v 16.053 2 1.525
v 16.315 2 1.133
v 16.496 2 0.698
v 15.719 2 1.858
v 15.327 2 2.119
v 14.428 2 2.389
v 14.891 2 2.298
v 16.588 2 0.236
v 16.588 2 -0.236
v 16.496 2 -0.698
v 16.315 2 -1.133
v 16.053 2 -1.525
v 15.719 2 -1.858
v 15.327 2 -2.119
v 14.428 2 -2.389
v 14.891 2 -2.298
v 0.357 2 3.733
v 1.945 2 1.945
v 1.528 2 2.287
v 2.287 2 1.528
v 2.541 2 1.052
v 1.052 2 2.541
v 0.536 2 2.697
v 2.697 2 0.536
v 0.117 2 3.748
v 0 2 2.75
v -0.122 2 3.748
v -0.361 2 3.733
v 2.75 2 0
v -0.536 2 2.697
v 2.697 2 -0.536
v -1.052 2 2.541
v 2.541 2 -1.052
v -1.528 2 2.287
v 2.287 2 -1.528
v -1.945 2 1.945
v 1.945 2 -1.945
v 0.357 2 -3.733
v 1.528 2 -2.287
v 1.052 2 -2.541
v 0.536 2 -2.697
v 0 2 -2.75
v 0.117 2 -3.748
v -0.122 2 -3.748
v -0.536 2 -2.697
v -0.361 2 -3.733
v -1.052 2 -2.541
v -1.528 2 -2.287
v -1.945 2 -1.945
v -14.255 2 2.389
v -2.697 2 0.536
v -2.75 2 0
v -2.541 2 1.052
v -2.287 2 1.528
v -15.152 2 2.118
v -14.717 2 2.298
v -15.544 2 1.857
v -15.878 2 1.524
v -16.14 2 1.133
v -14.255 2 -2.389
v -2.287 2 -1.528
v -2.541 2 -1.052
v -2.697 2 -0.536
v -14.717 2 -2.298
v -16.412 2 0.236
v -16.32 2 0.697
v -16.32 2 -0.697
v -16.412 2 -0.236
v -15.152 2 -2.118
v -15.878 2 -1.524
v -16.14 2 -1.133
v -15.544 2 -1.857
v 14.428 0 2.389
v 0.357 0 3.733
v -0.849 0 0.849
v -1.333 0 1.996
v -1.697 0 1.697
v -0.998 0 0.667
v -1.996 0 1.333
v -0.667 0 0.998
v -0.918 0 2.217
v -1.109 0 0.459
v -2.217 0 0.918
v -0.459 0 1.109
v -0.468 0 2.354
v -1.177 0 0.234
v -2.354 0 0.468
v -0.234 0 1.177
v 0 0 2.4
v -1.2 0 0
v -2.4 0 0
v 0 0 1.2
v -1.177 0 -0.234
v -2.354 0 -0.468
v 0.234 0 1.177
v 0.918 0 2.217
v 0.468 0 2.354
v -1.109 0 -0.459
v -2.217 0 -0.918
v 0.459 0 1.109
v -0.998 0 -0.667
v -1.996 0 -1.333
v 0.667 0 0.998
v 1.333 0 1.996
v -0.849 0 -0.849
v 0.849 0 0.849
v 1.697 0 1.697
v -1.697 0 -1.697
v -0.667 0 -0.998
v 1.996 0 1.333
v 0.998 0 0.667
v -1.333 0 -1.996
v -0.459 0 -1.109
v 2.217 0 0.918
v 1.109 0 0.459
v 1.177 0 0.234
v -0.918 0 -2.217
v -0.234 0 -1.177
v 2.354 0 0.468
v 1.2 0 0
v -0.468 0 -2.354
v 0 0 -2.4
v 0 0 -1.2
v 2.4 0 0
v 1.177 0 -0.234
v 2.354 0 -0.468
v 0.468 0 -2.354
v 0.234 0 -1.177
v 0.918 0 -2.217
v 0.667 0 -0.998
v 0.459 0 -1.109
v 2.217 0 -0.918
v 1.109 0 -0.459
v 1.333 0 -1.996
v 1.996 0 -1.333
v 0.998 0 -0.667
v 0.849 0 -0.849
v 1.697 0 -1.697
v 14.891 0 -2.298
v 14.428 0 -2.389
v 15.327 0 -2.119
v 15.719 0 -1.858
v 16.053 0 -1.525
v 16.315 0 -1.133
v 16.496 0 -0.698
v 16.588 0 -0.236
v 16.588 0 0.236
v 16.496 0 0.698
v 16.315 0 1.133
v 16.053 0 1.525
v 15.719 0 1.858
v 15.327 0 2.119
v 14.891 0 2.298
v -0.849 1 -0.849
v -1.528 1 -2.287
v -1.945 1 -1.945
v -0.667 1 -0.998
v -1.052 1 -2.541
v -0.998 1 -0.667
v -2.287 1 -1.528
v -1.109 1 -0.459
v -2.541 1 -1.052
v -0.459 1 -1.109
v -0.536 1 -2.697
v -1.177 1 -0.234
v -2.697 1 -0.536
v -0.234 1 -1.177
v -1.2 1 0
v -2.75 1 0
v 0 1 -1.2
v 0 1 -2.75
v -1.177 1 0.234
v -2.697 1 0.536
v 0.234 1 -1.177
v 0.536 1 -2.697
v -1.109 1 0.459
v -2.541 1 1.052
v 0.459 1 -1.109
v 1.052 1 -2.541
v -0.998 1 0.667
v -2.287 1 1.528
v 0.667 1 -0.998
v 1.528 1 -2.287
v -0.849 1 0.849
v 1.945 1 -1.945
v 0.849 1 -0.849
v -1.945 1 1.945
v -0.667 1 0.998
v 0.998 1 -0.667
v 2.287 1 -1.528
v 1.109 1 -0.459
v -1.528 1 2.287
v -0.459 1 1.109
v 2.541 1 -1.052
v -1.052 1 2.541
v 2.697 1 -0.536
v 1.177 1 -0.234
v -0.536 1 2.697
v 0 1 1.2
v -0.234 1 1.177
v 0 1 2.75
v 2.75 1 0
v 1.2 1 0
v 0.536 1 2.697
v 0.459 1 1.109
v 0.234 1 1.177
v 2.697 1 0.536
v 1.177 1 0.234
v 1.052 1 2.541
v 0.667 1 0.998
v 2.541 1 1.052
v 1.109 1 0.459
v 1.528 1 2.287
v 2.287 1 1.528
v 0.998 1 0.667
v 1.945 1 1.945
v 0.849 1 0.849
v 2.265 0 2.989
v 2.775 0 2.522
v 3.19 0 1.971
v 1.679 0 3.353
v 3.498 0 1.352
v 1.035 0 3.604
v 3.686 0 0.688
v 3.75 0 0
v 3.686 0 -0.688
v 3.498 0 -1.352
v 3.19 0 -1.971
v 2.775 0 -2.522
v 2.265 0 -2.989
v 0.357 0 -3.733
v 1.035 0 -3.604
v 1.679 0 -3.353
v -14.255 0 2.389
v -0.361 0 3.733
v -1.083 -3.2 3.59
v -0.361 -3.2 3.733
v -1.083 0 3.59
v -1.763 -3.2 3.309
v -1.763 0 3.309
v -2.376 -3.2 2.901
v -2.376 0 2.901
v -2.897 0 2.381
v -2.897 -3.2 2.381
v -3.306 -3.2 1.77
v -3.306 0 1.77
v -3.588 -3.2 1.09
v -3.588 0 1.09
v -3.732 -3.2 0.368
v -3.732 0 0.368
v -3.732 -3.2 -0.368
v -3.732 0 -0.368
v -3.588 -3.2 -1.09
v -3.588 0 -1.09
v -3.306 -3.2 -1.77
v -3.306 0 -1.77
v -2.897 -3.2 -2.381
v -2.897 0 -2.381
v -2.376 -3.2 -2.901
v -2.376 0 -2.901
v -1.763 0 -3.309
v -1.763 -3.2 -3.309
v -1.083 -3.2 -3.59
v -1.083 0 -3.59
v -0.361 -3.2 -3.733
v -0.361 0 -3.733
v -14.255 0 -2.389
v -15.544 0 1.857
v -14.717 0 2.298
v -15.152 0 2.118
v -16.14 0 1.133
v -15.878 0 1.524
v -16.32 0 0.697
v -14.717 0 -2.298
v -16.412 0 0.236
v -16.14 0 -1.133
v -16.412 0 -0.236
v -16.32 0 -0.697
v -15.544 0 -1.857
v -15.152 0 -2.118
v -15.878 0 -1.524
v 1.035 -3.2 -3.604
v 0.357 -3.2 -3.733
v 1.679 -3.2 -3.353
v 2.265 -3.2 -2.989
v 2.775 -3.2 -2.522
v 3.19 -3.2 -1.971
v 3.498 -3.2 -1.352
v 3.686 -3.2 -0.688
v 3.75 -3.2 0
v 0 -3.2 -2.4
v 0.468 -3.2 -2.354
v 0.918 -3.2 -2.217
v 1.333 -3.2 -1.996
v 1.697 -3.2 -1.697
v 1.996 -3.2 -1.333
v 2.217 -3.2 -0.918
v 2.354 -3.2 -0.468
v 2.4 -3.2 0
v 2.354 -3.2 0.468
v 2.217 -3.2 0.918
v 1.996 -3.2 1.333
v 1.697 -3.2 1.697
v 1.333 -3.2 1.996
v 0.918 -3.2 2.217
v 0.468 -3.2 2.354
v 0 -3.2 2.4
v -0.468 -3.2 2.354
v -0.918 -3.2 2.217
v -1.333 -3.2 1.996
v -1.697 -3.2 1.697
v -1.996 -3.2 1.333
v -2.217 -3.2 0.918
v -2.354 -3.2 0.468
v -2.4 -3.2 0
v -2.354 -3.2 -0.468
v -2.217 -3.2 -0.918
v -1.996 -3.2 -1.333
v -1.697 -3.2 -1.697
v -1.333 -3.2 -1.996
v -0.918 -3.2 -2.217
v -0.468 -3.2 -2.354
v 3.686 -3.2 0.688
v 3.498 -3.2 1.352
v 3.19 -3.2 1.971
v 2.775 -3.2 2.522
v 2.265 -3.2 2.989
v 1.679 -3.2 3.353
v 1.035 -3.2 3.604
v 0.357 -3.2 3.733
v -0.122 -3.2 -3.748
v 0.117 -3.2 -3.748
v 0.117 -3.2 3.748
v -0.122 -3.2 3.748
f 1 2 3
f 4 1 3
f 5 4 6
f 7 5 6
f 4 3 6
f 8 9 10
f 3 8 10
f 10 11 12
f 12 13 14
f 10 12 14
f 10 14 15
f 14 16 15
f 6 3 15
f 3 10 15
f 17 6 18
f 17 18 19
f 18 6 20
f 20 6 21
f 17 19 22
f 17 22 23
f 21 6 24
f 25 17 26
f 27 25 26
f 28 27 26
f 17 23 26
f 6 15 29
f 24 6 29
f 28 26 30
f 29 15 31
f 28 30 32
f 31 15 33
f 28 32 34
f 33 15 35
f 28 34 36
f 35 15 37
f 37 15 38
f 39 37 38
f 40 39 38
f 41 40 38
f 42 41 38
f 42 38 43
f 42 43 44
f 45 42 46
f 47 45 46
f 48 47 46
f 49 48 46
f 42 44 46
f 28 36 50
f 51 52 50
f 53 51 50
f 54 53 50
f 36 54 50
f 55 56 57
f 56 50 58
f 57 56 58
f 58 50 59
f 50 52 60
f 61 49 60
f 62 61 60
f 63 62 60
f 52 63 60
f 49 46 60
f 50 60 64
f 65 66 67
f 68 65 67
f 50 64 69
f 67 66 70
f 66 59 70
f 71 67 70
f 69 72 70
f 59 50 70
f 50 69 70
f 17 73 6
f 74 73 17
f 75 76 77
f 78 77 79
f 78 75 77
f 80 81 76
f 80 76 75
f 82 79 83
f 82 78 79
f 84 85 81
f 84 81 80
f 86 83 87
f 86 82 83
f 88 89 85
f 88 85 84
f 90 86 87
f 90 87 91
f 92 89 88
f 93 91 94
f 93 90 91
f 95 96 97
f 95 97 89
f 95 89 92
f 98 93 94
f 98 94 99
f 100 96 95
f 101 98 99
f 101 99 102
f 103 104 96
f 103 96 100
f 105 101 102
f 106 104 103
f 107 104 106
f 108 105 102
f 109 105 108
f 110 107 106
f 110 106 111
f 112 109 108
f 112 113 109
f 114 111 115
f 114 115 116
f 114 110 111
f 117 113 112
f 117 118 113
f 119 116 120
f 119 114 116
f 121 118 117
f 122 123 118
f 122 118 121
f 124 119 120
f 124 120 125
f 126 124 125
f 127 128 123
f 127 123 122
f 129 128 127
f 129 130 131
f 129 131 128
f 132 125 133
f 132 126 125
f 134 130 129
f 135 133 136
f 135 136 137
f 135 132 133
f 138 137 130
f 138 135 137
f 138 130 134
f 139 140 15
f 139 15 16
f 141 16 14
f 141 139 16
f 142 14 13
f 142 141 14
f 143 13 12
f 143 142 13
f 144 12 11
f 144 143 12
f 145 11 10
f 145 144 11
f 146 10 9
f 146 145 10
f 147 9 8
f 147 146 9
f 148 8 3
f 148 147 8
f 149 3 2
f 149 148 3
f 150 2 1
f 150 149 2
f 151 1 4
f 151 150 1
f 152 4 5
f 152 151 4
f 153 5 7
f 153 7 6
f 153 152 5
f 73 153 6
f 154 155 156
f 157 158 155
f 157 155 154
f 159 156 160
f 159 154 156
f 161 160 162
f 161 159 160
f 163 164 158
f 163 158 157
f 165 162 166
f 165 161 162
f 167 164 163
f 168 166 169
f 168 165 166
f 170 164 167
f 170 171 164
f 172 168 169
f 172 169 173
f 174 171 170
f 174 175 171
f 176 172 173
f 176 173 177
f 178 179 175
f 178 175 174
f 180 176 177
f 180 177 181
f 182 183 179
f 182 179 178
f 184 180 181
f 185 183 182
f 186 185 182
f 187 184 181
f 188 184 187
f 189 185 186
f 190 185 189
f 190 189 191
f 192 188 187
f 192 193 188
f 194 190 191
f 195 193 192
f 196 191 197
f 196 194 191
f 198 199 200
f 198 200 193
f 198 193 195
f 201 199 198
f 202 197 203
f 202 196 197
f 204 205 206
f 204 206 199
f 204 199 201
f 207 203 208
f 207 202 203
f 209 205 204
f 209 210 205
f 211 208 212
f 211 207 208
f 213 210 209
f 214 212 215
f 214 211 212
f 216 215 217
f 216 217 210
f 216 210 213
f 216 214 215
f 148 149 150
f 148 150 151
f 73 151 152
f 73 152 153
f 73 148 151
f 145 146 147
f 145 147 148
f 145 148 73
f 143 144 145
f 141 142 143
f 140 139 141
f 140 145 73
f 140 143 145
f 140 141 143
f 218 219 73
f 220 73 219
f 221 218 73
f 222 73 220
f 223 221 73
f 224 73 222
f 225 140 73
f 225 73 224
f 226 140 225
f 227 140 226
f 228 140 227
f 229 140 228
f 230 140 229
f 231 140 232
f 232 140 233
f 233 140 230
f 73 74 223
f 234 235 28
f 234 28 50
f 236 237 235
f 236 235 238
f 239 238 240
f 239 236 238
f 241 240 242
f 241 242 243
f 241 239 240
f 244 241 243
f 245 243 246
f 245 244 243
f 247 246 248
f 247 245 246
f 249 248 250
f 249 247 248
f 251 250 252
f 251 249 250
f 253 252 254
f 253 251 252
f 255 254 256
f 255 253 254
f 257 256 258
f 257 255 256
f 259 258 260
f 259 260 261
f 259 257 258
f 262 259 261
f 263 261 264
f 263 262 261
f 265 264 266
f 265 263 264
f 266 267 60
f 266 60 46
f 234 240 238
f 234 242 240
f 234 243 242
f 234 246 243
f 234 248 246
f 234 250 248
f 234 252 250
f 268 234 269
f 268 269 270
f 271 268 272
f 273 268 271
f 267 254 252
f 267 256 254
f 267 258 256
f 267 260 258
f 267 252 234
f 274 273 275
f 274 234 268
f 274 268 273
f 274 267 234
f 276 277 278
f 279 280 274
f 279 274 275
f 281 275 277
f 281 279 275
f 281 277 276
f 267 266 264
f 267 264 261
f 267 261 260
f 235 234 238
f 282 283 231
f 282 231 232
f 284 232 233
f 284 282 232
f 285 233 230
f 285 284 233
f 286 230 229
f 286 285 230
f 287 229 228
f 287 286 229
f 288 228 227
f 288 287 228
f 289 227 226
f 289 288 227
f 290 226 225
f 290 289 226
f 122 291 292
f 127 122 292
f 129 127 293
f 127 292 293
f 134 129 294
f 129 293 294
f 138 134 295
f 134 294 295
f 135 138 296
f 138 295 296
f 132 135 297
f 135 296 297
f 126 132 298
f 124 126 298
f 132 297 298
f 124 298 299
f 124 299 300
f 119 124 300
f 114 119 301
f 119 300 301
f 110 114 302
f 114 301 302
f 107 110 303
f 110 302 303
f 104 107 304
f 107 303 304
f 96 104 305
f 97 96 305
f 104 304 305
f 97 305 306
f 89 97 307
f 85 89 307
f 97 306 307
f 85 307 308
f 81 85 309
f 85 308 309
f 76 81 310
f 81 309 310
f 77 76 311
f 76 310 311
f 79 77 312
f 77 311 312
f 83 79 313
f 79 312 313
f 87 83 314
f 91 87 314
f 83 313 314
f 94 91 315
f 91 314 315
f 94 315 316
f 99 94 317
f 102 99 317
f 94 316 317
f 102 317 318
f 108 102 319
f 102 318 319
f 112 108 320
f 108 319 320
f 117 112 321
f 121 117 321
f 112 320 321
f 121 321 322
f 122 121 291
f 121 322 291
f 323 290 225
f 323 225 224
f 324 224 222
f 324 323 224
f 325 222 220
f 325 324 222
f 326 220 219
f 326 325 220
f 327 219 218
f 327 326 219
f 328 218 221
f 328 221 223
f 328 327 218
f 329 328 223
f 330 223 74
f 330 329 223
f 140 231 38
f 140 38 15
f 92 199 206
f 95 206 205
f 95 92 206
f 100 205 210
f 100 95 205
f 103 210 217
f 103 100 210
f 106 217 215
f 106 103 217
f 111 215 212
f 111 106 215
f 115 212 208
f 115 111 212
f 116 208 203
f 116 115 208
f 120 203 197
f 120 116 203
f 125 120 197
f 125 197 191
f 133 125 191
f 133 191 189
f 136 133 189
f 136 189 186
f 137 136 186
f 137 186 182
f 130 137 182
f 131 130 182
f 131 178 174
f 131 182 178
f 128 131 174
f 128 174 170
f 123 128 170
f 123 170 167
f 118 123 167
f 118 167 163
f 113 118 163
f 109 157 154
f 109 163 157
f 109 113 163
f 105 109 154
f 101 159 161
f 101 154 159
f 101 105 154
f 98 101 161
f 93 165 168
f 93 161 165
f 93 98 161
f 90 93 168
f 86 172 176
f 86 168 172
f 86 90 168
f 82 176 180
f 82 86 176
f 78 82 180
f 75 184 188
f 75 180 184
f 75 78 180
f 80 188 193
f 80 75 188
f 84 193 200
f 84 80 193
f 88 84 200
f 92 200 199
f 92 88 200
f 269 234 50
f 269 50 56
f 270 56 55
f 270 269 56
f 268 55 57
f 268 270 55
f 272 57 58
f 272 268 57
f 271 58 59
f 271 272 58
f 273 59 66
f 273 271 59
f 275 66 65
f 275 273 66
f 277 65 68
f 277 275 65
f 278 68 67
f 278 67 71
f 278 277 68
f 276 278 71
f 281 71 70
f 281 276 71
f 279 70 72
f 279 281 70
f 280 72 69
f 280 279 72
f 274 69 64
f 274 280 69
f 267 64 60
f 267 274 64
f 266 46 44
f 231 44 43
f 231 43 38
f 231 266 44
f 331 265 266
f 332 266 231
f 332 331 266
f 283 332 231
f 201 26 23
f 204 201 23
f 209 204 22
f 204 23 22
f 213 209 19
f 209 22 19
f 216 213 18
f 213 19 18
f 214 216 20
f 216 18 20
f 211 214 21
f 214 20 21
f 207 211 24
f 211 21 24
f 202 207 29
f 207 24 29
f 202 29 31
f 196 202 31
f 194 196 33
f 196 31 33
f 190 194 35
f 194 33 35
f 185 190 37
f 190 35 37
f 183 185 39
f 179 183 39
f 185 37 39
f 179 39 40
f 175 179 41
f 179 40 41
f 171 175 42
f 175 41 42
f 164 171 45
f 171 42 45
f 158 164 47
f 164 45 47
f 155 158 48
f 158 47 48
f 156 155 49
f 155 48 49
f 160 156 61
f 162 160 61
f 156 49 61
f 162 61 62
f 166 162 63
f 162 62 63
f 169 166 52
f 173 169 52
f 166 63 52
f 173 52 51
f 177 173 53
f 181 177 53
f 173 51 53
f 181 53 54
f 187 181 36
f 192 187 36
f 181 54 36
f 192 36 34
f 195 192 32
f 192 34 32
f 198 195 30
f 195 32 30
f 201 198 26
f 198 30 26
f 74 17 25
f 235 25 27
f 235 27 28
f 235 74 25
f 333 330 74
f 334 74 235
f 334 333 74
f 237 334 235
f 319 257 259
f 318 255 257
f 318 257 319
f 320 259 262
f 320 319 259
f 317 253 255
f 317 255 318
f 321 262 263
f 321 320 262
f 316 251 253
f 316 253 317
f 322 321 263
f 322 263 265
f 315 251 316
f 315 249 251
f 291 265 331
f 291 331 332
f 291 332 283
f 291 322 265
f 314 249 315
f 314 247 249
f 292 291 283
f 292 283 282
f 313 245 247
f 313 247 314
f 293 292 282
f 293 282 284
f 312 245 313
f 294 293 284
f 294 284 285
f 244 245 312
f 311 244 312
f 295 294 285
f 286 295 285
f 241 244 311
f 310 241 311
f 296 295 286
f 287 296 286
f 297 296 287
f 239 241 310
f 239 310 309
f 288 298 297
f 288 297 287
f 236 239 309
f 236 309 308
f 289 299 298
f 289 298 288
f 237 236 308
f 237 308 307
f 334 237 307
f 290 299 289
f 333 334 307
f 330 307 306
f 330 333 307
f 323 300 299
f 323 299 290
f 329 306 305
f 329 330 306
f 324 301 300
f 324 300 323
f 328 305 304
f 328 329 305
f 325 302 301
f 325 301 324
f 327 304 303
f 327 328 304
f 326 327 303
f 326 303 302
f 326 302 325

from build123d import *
from build123d.topology import SkipClean

# Parameters (mm, degrees)
SKETCH1_R           = 1.2
BOSS_EXTRUDE1_DEPTH = 2
BOSS_EXTRUDE2_START = 3.2
SKETCH2_R           = 1.2
BOSS_EXTRUDE2_DEPTH = 3.2
SKETCH3_R           = 2.4
CUT_EXTRUDE3_DEPTH  = 3.2
SKETCH4_R           = 2.75
CUT_EXTRUDE4_DEPTH  = 1


with BuildPart() as part:
    # Sketch1 → Boss-Extrude1 (new body)
    with BuildSketch(Plane(origin=(0, 0, 0), x_dir=(1, 0, 0), z_dir=(0, 1, 0))):
        with BuildLine():
            Line((0.356514085, 3.73301456), (14.428169014, 2.389129319))
            ThreePointArc((14.428169014, 2.389129319), (16.6, 0), (14.428169014, -2.389129319))
            Line((14.428169014, -2.389129319), (0.356514085, -3.73301456))
            ThreePointArc((0.356514085, -3.73301456), (-0.00225279, -3.749999323), (-0.360998998, -3.732583519))
            Line((-0.360998998, -3.732583519), (-14.254623989, -2.388853452))
            ThreePointArc((-14.254623989, -2.388853452), (-16.42358463, 0), (-14.254623989, 2.388853452))
            Line((-14.254623989, 2.388853452), (-0.360998998, 3.732583519))
            ThreePointArc((-0.360998998, 3.732583519), (-0.00225279, 3.749999323), (0.356514085, 3.73301456))
        make_face()
        with Locations(Location((0, 0, 0), (0, 0, 270))):
            Circle(SKETCH1_R, mode=Mode.SUBTRACT)
    extrude(amount=BOSS_EXTRUDE1_DEPTH)

    # Sketch2 → Boss-Extrude2 (add)
    with SkipClean():  # the faces are left unmerged after this step: merging them gives an invalid solid
        with BuildSketch(Plane.XZ.offset(BOSS_EXTRUDE2_START)):
            with BuildLine():
                ThreePointArc((3.75, 0), (2.774835835, 2.522456361), (0.356514085, 3.73301456))
                ThreePointArc((0.356514085, 3.73301456), (-0.00225279, 3.749999323), (-0.360998998, 3.732583519))
                ThreePointArc((-0.360998998, 3.732583519), (-3.75, 0), (-0.360998998, -3.732583519))
                ThreePointArc((-0.360998998, -3.732583519), (-0.00225279, -3.749999323), (0.356514085, -3.73301456))
                ThreePointArc((0.356514085, -3.73301456), (2.774835835, -2.522456361), (3.75, 0))
            make_face()
            with Locations(Location((0, 0, 0), (0, 0, 270))):
                Circle(SKETCH2_R, mode=Mode.SUBTRACT)
        extrude(amount=-BOSS_EXTRUDE2_DEPTH)

    # Sketch3 → Cut-Extrude3 (cut)
    with BuildSketch(Plane.XZ.offset(3.2)):
        with Locations(Location((0, 0, 0), (0, 0, 270))):
            Circle(SKETCH3_R)
    extrude(amount=-CUT_EXTRUDE3_DEPTH, mode=Mode.SUBTRACT)

    # Sketch4 → Cut-Extrude4 (cut)
    with BuildSketch(Plane(origin=(0, 2, 0), x_dir=(1, 0, 0), z_dir=(0, 1, 0))):
        with Locations(Location((0, 0, 0), (0, 0, 270))):
            Circle(SKETCH4_R)
    extrude(amount=-CUT_EXTRUDE4_DEPTH, mode=Mode.SUBTRACT)


solid = part.part
